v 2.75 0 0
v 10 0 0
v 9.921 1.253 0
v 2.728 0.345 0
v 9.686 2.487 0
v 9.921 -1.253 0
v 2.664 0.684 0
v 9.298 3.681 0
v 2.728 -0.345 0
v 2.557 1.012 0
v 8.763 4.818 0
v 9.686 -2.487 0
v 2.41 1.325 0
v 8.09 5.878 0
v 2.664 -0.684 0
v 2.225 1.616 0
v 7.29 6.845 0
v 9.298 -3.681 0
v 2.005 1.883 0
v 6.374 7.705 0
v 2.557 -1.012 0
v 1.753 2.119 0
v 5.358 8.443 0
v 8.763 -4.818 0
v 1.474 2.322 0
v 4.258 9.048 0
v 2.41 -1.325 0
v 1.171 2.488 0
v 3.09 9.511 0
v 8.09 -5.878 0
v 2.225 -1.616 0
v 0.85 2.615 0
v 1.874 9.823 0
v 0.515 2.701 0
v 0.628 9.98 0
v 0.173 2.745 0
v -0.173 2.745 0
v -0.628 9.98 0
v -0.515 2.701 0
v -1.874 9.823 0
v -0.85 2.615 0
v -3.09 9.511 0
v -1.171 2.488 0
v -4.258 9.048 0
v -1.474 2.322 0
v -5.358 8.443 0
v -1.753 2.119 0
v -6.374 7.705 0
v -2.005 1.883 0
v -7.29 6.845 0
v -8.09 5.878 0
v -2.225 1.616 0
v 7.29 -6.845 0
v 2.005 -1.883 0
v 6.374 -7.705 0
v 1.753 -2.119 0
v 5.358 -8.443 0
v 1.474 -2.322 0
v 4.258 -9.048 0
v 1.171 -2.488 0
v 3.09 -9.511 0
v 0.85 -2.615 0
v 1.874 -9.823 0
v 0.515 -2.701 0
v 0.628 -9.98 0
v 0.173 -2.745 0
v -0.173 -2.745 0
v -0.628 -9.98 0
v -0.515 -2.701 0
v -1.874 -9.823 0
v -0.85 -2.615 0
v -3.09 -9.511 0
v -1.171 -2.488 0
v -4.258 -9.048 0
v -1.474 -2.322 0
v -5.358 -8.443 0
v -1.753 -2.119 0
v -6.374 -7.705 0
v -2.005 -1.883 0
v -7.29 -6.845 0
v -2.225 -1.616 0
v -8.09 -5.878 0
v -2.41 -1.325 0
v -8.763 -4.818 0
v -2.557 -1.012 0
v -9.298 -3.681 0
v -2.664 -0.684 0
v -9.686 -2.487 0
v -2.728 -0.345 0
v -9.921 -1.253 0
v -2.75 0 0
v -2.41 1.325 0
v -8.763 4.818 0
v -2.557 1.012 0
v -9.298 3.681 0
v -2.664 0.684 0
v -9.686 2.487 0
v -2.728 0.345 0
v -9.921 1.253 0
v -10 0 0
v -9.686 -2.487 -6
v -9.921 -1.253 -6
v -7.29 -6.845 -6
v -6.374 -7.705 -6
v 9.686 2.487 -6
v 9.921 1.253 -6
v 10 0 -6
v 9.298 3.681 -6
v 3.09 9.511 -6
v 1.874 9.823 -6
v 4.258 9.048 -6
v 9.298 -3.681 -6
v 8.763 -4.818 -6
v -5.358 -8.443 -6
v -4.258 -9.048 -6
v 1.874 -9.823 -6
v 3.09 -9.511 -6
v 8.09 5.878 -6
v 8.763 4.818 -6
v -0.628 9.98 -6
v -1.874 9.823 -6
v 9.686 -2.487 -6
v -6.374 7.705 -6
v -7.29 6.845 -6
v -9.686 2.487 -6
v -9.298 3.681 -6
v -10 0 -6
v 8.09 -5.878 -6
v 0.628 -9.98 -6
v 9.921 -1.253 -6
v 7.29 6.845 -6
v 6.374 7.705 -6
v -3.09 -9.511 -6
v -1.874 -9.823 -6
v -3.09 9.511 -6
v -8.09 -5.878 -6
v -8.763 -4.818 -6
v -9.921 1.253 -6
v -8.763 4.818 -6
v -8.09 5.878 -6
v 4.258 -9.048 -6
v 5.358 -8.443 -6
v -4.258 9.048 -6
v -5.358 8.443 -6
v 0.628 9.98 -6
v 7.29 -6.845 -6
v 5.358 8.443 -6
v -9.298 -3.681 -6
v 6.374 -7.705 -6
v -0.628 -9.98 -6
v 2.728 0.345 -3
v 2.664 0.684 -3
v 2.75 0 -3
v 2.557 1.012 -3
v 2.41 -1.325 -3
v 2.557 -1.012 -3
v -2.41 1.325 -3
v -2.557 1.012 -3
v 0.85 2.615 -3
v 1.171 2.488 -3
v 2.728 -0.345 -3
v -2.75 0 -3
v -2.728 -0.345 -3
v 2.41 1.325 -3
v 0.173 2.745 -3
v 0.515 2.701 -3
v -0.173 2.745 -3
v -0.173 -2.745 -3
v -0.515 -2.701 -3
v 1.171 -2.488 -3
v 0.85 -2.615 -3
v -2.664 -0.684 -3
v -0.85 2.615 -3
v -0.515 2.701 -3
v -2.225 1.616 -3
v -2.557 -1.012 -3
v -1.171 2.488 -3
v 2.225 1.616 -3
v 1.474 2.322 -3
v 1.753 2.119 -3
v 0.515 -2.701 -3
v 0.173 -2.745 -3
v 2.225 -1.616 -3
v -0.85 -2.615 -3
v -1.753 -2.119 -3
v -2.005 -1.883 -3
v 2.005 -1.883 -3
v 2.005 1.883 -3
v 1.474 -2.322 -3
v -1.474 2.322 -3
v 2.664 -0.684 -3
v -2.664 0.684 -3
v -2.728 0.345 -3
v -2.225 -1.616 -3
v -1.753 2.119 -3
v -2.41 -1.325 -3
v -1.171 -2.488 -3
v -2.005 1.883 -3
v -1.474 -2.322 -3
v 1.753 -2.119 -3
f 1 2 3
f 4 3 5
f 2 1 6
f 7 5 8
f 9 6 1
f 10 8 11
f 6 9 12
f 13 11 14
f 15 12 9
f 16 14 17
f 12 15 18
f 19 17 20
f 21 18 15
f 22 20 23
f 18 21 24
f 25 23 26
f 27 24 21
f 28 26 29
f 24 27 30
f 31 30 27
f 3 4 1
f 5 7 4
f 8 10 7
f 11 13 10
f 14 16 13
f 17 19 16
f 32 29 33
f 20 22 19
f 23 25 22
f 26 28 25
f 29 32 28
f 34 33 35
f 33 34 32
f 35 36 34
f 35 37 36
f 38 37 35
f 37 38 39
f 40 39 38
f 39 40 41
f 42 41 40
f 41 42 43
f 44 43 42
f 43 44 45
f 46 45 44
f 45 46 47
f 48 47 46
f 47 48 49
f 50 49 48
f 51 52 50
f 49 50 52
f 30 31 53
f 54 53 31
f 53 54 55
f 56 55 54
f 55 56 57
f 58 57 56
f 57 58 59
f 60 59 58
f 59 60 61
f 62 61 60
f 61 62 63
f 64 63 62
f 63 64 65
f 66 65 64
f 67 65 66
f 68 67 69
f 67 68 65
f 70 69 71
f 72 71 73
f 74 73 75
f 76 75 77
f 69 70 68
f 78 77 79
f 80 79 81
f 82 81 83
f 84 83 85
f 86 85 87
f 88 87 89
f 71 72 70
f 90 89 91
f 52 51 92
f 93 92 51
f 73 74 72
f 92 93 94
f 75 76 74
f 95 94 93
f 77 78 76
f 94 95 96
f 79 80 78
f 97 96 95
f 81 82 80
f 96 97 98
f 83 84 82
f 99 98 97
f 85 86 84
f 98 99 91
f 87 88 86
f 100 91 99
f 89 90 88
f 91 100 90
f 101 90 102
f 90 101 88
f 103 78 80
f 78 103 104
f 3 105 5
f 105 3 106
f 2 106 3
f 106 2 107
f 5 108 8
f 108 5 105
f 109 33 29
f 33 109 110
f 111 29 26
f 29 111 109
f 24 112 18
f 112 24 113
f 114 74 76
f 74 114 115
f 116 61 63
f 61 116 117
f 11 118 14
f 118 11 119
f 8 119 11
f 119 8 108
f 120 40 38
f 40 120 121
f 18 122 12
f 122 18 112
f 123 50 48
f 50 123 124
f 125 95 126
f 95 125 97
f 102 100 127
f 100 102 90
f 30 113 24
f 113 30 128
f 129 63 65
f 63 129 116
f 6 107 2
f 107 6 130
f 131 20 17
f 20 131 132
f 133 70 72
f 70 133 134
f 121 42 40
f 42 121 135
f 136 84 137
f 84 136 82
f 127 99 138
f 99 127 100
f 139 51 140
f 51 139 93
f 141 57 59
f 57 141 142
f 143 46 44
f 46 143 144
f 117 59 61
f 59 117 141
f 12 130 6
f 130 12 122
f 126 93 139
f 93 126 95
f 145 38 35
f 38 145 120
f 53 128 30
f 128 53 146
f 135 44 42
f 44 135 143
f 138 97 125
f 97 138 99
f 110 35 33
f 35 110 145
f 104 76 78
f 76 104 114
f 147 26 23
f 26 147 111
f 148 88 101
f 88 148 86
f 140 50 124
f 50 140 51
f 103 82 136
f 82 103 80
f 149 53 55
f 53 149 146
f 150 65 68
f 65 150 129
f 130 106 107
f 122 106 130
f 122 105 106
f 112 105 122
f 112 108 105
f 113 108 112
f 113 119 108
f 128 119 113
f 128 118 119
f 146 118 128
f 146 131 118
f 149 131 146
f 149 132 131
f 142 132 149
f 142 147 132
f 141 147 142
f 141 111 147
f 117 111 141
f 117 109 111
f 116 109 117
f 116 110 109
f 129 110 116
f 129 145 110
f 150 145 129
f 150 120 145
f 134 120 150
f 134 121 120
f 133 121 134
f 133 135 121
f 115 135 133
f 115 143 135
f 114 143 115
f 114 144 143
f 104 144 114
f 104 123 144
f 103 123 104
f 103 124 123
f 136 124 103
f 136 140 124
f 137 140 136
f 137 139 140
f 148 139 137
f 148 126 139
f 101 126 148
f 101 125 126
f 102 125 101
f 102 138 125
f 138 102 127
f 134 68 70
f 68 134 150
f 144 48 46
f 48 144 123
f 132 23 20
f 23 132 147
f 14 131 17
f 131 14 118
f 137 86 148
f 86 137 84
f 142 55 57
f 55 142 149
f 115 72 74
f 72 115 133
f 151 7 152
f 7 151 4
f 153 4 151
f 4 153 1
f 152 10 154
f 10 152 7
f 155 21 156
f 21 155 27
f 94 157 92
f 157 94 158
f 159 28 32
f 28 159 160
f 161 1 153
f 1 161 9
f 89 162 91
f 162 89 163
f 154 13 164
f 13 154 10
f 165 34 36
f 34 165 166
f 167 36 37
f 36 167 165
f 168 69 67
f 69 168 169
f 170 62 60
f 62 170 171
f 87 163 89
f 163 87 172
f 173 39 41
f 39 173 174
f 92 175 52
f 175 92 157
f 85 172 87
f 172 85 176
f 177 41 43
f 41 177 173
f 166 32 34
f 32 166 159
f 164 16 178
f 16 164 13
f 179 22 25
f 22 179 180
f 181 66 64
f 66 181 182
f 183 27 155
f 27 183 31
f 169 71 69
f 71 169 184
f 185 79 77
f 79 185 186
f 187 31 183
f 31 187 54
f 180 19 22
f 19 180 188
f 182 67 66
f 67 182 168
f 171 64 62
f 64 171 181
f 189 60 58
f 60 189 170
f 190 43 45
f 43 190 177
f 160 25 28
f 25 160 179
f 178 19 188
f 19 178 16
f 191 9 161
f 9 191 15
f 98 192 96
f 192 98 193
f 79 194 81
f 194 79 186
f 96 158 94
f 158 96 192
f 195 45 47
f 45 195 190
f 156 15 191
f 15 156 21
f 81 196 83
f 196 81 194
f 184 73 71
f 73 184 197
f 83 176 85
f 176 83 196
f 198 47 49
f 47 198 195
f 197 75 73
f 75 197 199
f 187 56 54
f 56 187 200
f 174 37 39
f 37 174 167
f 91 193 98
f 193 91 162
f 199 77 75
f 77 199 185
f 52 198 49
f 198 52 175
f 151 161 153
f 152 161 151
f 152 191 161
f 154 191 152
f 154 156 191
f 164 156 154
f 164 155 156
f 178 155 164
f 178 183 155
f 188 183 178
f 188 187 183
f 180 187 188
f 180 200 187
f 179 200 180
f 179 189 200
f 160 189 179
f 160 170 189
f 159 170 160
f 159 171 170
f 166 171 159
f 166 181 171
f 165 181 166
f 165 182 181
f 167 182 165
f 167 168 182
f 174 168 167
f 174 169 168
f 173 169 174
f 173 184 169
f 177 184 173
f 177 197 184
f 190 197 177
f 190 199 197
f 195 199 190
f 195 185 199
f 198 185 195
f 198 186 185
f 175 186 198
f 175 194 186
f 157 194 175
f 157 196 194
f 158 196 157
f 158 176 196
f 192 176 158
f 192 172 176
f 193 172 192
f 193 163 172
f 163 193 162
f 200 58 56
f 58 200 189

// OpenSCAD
$fn = 50;


difference() {
	union() {
		translate(v = [0, 0, -3.0000000000]) {
			cylinder(h = 3, r = 7.0000000000);
		}
		translate(v = [0, 0, -6.0000000000]) {
			cylinder(h = 6, r = 10.0000000000);
		}
	}
	union() {
		#translate(v = [0, 0, -3]) {
			cylinder(h = 3, r = 2.7500000000);
		}
	}
}
